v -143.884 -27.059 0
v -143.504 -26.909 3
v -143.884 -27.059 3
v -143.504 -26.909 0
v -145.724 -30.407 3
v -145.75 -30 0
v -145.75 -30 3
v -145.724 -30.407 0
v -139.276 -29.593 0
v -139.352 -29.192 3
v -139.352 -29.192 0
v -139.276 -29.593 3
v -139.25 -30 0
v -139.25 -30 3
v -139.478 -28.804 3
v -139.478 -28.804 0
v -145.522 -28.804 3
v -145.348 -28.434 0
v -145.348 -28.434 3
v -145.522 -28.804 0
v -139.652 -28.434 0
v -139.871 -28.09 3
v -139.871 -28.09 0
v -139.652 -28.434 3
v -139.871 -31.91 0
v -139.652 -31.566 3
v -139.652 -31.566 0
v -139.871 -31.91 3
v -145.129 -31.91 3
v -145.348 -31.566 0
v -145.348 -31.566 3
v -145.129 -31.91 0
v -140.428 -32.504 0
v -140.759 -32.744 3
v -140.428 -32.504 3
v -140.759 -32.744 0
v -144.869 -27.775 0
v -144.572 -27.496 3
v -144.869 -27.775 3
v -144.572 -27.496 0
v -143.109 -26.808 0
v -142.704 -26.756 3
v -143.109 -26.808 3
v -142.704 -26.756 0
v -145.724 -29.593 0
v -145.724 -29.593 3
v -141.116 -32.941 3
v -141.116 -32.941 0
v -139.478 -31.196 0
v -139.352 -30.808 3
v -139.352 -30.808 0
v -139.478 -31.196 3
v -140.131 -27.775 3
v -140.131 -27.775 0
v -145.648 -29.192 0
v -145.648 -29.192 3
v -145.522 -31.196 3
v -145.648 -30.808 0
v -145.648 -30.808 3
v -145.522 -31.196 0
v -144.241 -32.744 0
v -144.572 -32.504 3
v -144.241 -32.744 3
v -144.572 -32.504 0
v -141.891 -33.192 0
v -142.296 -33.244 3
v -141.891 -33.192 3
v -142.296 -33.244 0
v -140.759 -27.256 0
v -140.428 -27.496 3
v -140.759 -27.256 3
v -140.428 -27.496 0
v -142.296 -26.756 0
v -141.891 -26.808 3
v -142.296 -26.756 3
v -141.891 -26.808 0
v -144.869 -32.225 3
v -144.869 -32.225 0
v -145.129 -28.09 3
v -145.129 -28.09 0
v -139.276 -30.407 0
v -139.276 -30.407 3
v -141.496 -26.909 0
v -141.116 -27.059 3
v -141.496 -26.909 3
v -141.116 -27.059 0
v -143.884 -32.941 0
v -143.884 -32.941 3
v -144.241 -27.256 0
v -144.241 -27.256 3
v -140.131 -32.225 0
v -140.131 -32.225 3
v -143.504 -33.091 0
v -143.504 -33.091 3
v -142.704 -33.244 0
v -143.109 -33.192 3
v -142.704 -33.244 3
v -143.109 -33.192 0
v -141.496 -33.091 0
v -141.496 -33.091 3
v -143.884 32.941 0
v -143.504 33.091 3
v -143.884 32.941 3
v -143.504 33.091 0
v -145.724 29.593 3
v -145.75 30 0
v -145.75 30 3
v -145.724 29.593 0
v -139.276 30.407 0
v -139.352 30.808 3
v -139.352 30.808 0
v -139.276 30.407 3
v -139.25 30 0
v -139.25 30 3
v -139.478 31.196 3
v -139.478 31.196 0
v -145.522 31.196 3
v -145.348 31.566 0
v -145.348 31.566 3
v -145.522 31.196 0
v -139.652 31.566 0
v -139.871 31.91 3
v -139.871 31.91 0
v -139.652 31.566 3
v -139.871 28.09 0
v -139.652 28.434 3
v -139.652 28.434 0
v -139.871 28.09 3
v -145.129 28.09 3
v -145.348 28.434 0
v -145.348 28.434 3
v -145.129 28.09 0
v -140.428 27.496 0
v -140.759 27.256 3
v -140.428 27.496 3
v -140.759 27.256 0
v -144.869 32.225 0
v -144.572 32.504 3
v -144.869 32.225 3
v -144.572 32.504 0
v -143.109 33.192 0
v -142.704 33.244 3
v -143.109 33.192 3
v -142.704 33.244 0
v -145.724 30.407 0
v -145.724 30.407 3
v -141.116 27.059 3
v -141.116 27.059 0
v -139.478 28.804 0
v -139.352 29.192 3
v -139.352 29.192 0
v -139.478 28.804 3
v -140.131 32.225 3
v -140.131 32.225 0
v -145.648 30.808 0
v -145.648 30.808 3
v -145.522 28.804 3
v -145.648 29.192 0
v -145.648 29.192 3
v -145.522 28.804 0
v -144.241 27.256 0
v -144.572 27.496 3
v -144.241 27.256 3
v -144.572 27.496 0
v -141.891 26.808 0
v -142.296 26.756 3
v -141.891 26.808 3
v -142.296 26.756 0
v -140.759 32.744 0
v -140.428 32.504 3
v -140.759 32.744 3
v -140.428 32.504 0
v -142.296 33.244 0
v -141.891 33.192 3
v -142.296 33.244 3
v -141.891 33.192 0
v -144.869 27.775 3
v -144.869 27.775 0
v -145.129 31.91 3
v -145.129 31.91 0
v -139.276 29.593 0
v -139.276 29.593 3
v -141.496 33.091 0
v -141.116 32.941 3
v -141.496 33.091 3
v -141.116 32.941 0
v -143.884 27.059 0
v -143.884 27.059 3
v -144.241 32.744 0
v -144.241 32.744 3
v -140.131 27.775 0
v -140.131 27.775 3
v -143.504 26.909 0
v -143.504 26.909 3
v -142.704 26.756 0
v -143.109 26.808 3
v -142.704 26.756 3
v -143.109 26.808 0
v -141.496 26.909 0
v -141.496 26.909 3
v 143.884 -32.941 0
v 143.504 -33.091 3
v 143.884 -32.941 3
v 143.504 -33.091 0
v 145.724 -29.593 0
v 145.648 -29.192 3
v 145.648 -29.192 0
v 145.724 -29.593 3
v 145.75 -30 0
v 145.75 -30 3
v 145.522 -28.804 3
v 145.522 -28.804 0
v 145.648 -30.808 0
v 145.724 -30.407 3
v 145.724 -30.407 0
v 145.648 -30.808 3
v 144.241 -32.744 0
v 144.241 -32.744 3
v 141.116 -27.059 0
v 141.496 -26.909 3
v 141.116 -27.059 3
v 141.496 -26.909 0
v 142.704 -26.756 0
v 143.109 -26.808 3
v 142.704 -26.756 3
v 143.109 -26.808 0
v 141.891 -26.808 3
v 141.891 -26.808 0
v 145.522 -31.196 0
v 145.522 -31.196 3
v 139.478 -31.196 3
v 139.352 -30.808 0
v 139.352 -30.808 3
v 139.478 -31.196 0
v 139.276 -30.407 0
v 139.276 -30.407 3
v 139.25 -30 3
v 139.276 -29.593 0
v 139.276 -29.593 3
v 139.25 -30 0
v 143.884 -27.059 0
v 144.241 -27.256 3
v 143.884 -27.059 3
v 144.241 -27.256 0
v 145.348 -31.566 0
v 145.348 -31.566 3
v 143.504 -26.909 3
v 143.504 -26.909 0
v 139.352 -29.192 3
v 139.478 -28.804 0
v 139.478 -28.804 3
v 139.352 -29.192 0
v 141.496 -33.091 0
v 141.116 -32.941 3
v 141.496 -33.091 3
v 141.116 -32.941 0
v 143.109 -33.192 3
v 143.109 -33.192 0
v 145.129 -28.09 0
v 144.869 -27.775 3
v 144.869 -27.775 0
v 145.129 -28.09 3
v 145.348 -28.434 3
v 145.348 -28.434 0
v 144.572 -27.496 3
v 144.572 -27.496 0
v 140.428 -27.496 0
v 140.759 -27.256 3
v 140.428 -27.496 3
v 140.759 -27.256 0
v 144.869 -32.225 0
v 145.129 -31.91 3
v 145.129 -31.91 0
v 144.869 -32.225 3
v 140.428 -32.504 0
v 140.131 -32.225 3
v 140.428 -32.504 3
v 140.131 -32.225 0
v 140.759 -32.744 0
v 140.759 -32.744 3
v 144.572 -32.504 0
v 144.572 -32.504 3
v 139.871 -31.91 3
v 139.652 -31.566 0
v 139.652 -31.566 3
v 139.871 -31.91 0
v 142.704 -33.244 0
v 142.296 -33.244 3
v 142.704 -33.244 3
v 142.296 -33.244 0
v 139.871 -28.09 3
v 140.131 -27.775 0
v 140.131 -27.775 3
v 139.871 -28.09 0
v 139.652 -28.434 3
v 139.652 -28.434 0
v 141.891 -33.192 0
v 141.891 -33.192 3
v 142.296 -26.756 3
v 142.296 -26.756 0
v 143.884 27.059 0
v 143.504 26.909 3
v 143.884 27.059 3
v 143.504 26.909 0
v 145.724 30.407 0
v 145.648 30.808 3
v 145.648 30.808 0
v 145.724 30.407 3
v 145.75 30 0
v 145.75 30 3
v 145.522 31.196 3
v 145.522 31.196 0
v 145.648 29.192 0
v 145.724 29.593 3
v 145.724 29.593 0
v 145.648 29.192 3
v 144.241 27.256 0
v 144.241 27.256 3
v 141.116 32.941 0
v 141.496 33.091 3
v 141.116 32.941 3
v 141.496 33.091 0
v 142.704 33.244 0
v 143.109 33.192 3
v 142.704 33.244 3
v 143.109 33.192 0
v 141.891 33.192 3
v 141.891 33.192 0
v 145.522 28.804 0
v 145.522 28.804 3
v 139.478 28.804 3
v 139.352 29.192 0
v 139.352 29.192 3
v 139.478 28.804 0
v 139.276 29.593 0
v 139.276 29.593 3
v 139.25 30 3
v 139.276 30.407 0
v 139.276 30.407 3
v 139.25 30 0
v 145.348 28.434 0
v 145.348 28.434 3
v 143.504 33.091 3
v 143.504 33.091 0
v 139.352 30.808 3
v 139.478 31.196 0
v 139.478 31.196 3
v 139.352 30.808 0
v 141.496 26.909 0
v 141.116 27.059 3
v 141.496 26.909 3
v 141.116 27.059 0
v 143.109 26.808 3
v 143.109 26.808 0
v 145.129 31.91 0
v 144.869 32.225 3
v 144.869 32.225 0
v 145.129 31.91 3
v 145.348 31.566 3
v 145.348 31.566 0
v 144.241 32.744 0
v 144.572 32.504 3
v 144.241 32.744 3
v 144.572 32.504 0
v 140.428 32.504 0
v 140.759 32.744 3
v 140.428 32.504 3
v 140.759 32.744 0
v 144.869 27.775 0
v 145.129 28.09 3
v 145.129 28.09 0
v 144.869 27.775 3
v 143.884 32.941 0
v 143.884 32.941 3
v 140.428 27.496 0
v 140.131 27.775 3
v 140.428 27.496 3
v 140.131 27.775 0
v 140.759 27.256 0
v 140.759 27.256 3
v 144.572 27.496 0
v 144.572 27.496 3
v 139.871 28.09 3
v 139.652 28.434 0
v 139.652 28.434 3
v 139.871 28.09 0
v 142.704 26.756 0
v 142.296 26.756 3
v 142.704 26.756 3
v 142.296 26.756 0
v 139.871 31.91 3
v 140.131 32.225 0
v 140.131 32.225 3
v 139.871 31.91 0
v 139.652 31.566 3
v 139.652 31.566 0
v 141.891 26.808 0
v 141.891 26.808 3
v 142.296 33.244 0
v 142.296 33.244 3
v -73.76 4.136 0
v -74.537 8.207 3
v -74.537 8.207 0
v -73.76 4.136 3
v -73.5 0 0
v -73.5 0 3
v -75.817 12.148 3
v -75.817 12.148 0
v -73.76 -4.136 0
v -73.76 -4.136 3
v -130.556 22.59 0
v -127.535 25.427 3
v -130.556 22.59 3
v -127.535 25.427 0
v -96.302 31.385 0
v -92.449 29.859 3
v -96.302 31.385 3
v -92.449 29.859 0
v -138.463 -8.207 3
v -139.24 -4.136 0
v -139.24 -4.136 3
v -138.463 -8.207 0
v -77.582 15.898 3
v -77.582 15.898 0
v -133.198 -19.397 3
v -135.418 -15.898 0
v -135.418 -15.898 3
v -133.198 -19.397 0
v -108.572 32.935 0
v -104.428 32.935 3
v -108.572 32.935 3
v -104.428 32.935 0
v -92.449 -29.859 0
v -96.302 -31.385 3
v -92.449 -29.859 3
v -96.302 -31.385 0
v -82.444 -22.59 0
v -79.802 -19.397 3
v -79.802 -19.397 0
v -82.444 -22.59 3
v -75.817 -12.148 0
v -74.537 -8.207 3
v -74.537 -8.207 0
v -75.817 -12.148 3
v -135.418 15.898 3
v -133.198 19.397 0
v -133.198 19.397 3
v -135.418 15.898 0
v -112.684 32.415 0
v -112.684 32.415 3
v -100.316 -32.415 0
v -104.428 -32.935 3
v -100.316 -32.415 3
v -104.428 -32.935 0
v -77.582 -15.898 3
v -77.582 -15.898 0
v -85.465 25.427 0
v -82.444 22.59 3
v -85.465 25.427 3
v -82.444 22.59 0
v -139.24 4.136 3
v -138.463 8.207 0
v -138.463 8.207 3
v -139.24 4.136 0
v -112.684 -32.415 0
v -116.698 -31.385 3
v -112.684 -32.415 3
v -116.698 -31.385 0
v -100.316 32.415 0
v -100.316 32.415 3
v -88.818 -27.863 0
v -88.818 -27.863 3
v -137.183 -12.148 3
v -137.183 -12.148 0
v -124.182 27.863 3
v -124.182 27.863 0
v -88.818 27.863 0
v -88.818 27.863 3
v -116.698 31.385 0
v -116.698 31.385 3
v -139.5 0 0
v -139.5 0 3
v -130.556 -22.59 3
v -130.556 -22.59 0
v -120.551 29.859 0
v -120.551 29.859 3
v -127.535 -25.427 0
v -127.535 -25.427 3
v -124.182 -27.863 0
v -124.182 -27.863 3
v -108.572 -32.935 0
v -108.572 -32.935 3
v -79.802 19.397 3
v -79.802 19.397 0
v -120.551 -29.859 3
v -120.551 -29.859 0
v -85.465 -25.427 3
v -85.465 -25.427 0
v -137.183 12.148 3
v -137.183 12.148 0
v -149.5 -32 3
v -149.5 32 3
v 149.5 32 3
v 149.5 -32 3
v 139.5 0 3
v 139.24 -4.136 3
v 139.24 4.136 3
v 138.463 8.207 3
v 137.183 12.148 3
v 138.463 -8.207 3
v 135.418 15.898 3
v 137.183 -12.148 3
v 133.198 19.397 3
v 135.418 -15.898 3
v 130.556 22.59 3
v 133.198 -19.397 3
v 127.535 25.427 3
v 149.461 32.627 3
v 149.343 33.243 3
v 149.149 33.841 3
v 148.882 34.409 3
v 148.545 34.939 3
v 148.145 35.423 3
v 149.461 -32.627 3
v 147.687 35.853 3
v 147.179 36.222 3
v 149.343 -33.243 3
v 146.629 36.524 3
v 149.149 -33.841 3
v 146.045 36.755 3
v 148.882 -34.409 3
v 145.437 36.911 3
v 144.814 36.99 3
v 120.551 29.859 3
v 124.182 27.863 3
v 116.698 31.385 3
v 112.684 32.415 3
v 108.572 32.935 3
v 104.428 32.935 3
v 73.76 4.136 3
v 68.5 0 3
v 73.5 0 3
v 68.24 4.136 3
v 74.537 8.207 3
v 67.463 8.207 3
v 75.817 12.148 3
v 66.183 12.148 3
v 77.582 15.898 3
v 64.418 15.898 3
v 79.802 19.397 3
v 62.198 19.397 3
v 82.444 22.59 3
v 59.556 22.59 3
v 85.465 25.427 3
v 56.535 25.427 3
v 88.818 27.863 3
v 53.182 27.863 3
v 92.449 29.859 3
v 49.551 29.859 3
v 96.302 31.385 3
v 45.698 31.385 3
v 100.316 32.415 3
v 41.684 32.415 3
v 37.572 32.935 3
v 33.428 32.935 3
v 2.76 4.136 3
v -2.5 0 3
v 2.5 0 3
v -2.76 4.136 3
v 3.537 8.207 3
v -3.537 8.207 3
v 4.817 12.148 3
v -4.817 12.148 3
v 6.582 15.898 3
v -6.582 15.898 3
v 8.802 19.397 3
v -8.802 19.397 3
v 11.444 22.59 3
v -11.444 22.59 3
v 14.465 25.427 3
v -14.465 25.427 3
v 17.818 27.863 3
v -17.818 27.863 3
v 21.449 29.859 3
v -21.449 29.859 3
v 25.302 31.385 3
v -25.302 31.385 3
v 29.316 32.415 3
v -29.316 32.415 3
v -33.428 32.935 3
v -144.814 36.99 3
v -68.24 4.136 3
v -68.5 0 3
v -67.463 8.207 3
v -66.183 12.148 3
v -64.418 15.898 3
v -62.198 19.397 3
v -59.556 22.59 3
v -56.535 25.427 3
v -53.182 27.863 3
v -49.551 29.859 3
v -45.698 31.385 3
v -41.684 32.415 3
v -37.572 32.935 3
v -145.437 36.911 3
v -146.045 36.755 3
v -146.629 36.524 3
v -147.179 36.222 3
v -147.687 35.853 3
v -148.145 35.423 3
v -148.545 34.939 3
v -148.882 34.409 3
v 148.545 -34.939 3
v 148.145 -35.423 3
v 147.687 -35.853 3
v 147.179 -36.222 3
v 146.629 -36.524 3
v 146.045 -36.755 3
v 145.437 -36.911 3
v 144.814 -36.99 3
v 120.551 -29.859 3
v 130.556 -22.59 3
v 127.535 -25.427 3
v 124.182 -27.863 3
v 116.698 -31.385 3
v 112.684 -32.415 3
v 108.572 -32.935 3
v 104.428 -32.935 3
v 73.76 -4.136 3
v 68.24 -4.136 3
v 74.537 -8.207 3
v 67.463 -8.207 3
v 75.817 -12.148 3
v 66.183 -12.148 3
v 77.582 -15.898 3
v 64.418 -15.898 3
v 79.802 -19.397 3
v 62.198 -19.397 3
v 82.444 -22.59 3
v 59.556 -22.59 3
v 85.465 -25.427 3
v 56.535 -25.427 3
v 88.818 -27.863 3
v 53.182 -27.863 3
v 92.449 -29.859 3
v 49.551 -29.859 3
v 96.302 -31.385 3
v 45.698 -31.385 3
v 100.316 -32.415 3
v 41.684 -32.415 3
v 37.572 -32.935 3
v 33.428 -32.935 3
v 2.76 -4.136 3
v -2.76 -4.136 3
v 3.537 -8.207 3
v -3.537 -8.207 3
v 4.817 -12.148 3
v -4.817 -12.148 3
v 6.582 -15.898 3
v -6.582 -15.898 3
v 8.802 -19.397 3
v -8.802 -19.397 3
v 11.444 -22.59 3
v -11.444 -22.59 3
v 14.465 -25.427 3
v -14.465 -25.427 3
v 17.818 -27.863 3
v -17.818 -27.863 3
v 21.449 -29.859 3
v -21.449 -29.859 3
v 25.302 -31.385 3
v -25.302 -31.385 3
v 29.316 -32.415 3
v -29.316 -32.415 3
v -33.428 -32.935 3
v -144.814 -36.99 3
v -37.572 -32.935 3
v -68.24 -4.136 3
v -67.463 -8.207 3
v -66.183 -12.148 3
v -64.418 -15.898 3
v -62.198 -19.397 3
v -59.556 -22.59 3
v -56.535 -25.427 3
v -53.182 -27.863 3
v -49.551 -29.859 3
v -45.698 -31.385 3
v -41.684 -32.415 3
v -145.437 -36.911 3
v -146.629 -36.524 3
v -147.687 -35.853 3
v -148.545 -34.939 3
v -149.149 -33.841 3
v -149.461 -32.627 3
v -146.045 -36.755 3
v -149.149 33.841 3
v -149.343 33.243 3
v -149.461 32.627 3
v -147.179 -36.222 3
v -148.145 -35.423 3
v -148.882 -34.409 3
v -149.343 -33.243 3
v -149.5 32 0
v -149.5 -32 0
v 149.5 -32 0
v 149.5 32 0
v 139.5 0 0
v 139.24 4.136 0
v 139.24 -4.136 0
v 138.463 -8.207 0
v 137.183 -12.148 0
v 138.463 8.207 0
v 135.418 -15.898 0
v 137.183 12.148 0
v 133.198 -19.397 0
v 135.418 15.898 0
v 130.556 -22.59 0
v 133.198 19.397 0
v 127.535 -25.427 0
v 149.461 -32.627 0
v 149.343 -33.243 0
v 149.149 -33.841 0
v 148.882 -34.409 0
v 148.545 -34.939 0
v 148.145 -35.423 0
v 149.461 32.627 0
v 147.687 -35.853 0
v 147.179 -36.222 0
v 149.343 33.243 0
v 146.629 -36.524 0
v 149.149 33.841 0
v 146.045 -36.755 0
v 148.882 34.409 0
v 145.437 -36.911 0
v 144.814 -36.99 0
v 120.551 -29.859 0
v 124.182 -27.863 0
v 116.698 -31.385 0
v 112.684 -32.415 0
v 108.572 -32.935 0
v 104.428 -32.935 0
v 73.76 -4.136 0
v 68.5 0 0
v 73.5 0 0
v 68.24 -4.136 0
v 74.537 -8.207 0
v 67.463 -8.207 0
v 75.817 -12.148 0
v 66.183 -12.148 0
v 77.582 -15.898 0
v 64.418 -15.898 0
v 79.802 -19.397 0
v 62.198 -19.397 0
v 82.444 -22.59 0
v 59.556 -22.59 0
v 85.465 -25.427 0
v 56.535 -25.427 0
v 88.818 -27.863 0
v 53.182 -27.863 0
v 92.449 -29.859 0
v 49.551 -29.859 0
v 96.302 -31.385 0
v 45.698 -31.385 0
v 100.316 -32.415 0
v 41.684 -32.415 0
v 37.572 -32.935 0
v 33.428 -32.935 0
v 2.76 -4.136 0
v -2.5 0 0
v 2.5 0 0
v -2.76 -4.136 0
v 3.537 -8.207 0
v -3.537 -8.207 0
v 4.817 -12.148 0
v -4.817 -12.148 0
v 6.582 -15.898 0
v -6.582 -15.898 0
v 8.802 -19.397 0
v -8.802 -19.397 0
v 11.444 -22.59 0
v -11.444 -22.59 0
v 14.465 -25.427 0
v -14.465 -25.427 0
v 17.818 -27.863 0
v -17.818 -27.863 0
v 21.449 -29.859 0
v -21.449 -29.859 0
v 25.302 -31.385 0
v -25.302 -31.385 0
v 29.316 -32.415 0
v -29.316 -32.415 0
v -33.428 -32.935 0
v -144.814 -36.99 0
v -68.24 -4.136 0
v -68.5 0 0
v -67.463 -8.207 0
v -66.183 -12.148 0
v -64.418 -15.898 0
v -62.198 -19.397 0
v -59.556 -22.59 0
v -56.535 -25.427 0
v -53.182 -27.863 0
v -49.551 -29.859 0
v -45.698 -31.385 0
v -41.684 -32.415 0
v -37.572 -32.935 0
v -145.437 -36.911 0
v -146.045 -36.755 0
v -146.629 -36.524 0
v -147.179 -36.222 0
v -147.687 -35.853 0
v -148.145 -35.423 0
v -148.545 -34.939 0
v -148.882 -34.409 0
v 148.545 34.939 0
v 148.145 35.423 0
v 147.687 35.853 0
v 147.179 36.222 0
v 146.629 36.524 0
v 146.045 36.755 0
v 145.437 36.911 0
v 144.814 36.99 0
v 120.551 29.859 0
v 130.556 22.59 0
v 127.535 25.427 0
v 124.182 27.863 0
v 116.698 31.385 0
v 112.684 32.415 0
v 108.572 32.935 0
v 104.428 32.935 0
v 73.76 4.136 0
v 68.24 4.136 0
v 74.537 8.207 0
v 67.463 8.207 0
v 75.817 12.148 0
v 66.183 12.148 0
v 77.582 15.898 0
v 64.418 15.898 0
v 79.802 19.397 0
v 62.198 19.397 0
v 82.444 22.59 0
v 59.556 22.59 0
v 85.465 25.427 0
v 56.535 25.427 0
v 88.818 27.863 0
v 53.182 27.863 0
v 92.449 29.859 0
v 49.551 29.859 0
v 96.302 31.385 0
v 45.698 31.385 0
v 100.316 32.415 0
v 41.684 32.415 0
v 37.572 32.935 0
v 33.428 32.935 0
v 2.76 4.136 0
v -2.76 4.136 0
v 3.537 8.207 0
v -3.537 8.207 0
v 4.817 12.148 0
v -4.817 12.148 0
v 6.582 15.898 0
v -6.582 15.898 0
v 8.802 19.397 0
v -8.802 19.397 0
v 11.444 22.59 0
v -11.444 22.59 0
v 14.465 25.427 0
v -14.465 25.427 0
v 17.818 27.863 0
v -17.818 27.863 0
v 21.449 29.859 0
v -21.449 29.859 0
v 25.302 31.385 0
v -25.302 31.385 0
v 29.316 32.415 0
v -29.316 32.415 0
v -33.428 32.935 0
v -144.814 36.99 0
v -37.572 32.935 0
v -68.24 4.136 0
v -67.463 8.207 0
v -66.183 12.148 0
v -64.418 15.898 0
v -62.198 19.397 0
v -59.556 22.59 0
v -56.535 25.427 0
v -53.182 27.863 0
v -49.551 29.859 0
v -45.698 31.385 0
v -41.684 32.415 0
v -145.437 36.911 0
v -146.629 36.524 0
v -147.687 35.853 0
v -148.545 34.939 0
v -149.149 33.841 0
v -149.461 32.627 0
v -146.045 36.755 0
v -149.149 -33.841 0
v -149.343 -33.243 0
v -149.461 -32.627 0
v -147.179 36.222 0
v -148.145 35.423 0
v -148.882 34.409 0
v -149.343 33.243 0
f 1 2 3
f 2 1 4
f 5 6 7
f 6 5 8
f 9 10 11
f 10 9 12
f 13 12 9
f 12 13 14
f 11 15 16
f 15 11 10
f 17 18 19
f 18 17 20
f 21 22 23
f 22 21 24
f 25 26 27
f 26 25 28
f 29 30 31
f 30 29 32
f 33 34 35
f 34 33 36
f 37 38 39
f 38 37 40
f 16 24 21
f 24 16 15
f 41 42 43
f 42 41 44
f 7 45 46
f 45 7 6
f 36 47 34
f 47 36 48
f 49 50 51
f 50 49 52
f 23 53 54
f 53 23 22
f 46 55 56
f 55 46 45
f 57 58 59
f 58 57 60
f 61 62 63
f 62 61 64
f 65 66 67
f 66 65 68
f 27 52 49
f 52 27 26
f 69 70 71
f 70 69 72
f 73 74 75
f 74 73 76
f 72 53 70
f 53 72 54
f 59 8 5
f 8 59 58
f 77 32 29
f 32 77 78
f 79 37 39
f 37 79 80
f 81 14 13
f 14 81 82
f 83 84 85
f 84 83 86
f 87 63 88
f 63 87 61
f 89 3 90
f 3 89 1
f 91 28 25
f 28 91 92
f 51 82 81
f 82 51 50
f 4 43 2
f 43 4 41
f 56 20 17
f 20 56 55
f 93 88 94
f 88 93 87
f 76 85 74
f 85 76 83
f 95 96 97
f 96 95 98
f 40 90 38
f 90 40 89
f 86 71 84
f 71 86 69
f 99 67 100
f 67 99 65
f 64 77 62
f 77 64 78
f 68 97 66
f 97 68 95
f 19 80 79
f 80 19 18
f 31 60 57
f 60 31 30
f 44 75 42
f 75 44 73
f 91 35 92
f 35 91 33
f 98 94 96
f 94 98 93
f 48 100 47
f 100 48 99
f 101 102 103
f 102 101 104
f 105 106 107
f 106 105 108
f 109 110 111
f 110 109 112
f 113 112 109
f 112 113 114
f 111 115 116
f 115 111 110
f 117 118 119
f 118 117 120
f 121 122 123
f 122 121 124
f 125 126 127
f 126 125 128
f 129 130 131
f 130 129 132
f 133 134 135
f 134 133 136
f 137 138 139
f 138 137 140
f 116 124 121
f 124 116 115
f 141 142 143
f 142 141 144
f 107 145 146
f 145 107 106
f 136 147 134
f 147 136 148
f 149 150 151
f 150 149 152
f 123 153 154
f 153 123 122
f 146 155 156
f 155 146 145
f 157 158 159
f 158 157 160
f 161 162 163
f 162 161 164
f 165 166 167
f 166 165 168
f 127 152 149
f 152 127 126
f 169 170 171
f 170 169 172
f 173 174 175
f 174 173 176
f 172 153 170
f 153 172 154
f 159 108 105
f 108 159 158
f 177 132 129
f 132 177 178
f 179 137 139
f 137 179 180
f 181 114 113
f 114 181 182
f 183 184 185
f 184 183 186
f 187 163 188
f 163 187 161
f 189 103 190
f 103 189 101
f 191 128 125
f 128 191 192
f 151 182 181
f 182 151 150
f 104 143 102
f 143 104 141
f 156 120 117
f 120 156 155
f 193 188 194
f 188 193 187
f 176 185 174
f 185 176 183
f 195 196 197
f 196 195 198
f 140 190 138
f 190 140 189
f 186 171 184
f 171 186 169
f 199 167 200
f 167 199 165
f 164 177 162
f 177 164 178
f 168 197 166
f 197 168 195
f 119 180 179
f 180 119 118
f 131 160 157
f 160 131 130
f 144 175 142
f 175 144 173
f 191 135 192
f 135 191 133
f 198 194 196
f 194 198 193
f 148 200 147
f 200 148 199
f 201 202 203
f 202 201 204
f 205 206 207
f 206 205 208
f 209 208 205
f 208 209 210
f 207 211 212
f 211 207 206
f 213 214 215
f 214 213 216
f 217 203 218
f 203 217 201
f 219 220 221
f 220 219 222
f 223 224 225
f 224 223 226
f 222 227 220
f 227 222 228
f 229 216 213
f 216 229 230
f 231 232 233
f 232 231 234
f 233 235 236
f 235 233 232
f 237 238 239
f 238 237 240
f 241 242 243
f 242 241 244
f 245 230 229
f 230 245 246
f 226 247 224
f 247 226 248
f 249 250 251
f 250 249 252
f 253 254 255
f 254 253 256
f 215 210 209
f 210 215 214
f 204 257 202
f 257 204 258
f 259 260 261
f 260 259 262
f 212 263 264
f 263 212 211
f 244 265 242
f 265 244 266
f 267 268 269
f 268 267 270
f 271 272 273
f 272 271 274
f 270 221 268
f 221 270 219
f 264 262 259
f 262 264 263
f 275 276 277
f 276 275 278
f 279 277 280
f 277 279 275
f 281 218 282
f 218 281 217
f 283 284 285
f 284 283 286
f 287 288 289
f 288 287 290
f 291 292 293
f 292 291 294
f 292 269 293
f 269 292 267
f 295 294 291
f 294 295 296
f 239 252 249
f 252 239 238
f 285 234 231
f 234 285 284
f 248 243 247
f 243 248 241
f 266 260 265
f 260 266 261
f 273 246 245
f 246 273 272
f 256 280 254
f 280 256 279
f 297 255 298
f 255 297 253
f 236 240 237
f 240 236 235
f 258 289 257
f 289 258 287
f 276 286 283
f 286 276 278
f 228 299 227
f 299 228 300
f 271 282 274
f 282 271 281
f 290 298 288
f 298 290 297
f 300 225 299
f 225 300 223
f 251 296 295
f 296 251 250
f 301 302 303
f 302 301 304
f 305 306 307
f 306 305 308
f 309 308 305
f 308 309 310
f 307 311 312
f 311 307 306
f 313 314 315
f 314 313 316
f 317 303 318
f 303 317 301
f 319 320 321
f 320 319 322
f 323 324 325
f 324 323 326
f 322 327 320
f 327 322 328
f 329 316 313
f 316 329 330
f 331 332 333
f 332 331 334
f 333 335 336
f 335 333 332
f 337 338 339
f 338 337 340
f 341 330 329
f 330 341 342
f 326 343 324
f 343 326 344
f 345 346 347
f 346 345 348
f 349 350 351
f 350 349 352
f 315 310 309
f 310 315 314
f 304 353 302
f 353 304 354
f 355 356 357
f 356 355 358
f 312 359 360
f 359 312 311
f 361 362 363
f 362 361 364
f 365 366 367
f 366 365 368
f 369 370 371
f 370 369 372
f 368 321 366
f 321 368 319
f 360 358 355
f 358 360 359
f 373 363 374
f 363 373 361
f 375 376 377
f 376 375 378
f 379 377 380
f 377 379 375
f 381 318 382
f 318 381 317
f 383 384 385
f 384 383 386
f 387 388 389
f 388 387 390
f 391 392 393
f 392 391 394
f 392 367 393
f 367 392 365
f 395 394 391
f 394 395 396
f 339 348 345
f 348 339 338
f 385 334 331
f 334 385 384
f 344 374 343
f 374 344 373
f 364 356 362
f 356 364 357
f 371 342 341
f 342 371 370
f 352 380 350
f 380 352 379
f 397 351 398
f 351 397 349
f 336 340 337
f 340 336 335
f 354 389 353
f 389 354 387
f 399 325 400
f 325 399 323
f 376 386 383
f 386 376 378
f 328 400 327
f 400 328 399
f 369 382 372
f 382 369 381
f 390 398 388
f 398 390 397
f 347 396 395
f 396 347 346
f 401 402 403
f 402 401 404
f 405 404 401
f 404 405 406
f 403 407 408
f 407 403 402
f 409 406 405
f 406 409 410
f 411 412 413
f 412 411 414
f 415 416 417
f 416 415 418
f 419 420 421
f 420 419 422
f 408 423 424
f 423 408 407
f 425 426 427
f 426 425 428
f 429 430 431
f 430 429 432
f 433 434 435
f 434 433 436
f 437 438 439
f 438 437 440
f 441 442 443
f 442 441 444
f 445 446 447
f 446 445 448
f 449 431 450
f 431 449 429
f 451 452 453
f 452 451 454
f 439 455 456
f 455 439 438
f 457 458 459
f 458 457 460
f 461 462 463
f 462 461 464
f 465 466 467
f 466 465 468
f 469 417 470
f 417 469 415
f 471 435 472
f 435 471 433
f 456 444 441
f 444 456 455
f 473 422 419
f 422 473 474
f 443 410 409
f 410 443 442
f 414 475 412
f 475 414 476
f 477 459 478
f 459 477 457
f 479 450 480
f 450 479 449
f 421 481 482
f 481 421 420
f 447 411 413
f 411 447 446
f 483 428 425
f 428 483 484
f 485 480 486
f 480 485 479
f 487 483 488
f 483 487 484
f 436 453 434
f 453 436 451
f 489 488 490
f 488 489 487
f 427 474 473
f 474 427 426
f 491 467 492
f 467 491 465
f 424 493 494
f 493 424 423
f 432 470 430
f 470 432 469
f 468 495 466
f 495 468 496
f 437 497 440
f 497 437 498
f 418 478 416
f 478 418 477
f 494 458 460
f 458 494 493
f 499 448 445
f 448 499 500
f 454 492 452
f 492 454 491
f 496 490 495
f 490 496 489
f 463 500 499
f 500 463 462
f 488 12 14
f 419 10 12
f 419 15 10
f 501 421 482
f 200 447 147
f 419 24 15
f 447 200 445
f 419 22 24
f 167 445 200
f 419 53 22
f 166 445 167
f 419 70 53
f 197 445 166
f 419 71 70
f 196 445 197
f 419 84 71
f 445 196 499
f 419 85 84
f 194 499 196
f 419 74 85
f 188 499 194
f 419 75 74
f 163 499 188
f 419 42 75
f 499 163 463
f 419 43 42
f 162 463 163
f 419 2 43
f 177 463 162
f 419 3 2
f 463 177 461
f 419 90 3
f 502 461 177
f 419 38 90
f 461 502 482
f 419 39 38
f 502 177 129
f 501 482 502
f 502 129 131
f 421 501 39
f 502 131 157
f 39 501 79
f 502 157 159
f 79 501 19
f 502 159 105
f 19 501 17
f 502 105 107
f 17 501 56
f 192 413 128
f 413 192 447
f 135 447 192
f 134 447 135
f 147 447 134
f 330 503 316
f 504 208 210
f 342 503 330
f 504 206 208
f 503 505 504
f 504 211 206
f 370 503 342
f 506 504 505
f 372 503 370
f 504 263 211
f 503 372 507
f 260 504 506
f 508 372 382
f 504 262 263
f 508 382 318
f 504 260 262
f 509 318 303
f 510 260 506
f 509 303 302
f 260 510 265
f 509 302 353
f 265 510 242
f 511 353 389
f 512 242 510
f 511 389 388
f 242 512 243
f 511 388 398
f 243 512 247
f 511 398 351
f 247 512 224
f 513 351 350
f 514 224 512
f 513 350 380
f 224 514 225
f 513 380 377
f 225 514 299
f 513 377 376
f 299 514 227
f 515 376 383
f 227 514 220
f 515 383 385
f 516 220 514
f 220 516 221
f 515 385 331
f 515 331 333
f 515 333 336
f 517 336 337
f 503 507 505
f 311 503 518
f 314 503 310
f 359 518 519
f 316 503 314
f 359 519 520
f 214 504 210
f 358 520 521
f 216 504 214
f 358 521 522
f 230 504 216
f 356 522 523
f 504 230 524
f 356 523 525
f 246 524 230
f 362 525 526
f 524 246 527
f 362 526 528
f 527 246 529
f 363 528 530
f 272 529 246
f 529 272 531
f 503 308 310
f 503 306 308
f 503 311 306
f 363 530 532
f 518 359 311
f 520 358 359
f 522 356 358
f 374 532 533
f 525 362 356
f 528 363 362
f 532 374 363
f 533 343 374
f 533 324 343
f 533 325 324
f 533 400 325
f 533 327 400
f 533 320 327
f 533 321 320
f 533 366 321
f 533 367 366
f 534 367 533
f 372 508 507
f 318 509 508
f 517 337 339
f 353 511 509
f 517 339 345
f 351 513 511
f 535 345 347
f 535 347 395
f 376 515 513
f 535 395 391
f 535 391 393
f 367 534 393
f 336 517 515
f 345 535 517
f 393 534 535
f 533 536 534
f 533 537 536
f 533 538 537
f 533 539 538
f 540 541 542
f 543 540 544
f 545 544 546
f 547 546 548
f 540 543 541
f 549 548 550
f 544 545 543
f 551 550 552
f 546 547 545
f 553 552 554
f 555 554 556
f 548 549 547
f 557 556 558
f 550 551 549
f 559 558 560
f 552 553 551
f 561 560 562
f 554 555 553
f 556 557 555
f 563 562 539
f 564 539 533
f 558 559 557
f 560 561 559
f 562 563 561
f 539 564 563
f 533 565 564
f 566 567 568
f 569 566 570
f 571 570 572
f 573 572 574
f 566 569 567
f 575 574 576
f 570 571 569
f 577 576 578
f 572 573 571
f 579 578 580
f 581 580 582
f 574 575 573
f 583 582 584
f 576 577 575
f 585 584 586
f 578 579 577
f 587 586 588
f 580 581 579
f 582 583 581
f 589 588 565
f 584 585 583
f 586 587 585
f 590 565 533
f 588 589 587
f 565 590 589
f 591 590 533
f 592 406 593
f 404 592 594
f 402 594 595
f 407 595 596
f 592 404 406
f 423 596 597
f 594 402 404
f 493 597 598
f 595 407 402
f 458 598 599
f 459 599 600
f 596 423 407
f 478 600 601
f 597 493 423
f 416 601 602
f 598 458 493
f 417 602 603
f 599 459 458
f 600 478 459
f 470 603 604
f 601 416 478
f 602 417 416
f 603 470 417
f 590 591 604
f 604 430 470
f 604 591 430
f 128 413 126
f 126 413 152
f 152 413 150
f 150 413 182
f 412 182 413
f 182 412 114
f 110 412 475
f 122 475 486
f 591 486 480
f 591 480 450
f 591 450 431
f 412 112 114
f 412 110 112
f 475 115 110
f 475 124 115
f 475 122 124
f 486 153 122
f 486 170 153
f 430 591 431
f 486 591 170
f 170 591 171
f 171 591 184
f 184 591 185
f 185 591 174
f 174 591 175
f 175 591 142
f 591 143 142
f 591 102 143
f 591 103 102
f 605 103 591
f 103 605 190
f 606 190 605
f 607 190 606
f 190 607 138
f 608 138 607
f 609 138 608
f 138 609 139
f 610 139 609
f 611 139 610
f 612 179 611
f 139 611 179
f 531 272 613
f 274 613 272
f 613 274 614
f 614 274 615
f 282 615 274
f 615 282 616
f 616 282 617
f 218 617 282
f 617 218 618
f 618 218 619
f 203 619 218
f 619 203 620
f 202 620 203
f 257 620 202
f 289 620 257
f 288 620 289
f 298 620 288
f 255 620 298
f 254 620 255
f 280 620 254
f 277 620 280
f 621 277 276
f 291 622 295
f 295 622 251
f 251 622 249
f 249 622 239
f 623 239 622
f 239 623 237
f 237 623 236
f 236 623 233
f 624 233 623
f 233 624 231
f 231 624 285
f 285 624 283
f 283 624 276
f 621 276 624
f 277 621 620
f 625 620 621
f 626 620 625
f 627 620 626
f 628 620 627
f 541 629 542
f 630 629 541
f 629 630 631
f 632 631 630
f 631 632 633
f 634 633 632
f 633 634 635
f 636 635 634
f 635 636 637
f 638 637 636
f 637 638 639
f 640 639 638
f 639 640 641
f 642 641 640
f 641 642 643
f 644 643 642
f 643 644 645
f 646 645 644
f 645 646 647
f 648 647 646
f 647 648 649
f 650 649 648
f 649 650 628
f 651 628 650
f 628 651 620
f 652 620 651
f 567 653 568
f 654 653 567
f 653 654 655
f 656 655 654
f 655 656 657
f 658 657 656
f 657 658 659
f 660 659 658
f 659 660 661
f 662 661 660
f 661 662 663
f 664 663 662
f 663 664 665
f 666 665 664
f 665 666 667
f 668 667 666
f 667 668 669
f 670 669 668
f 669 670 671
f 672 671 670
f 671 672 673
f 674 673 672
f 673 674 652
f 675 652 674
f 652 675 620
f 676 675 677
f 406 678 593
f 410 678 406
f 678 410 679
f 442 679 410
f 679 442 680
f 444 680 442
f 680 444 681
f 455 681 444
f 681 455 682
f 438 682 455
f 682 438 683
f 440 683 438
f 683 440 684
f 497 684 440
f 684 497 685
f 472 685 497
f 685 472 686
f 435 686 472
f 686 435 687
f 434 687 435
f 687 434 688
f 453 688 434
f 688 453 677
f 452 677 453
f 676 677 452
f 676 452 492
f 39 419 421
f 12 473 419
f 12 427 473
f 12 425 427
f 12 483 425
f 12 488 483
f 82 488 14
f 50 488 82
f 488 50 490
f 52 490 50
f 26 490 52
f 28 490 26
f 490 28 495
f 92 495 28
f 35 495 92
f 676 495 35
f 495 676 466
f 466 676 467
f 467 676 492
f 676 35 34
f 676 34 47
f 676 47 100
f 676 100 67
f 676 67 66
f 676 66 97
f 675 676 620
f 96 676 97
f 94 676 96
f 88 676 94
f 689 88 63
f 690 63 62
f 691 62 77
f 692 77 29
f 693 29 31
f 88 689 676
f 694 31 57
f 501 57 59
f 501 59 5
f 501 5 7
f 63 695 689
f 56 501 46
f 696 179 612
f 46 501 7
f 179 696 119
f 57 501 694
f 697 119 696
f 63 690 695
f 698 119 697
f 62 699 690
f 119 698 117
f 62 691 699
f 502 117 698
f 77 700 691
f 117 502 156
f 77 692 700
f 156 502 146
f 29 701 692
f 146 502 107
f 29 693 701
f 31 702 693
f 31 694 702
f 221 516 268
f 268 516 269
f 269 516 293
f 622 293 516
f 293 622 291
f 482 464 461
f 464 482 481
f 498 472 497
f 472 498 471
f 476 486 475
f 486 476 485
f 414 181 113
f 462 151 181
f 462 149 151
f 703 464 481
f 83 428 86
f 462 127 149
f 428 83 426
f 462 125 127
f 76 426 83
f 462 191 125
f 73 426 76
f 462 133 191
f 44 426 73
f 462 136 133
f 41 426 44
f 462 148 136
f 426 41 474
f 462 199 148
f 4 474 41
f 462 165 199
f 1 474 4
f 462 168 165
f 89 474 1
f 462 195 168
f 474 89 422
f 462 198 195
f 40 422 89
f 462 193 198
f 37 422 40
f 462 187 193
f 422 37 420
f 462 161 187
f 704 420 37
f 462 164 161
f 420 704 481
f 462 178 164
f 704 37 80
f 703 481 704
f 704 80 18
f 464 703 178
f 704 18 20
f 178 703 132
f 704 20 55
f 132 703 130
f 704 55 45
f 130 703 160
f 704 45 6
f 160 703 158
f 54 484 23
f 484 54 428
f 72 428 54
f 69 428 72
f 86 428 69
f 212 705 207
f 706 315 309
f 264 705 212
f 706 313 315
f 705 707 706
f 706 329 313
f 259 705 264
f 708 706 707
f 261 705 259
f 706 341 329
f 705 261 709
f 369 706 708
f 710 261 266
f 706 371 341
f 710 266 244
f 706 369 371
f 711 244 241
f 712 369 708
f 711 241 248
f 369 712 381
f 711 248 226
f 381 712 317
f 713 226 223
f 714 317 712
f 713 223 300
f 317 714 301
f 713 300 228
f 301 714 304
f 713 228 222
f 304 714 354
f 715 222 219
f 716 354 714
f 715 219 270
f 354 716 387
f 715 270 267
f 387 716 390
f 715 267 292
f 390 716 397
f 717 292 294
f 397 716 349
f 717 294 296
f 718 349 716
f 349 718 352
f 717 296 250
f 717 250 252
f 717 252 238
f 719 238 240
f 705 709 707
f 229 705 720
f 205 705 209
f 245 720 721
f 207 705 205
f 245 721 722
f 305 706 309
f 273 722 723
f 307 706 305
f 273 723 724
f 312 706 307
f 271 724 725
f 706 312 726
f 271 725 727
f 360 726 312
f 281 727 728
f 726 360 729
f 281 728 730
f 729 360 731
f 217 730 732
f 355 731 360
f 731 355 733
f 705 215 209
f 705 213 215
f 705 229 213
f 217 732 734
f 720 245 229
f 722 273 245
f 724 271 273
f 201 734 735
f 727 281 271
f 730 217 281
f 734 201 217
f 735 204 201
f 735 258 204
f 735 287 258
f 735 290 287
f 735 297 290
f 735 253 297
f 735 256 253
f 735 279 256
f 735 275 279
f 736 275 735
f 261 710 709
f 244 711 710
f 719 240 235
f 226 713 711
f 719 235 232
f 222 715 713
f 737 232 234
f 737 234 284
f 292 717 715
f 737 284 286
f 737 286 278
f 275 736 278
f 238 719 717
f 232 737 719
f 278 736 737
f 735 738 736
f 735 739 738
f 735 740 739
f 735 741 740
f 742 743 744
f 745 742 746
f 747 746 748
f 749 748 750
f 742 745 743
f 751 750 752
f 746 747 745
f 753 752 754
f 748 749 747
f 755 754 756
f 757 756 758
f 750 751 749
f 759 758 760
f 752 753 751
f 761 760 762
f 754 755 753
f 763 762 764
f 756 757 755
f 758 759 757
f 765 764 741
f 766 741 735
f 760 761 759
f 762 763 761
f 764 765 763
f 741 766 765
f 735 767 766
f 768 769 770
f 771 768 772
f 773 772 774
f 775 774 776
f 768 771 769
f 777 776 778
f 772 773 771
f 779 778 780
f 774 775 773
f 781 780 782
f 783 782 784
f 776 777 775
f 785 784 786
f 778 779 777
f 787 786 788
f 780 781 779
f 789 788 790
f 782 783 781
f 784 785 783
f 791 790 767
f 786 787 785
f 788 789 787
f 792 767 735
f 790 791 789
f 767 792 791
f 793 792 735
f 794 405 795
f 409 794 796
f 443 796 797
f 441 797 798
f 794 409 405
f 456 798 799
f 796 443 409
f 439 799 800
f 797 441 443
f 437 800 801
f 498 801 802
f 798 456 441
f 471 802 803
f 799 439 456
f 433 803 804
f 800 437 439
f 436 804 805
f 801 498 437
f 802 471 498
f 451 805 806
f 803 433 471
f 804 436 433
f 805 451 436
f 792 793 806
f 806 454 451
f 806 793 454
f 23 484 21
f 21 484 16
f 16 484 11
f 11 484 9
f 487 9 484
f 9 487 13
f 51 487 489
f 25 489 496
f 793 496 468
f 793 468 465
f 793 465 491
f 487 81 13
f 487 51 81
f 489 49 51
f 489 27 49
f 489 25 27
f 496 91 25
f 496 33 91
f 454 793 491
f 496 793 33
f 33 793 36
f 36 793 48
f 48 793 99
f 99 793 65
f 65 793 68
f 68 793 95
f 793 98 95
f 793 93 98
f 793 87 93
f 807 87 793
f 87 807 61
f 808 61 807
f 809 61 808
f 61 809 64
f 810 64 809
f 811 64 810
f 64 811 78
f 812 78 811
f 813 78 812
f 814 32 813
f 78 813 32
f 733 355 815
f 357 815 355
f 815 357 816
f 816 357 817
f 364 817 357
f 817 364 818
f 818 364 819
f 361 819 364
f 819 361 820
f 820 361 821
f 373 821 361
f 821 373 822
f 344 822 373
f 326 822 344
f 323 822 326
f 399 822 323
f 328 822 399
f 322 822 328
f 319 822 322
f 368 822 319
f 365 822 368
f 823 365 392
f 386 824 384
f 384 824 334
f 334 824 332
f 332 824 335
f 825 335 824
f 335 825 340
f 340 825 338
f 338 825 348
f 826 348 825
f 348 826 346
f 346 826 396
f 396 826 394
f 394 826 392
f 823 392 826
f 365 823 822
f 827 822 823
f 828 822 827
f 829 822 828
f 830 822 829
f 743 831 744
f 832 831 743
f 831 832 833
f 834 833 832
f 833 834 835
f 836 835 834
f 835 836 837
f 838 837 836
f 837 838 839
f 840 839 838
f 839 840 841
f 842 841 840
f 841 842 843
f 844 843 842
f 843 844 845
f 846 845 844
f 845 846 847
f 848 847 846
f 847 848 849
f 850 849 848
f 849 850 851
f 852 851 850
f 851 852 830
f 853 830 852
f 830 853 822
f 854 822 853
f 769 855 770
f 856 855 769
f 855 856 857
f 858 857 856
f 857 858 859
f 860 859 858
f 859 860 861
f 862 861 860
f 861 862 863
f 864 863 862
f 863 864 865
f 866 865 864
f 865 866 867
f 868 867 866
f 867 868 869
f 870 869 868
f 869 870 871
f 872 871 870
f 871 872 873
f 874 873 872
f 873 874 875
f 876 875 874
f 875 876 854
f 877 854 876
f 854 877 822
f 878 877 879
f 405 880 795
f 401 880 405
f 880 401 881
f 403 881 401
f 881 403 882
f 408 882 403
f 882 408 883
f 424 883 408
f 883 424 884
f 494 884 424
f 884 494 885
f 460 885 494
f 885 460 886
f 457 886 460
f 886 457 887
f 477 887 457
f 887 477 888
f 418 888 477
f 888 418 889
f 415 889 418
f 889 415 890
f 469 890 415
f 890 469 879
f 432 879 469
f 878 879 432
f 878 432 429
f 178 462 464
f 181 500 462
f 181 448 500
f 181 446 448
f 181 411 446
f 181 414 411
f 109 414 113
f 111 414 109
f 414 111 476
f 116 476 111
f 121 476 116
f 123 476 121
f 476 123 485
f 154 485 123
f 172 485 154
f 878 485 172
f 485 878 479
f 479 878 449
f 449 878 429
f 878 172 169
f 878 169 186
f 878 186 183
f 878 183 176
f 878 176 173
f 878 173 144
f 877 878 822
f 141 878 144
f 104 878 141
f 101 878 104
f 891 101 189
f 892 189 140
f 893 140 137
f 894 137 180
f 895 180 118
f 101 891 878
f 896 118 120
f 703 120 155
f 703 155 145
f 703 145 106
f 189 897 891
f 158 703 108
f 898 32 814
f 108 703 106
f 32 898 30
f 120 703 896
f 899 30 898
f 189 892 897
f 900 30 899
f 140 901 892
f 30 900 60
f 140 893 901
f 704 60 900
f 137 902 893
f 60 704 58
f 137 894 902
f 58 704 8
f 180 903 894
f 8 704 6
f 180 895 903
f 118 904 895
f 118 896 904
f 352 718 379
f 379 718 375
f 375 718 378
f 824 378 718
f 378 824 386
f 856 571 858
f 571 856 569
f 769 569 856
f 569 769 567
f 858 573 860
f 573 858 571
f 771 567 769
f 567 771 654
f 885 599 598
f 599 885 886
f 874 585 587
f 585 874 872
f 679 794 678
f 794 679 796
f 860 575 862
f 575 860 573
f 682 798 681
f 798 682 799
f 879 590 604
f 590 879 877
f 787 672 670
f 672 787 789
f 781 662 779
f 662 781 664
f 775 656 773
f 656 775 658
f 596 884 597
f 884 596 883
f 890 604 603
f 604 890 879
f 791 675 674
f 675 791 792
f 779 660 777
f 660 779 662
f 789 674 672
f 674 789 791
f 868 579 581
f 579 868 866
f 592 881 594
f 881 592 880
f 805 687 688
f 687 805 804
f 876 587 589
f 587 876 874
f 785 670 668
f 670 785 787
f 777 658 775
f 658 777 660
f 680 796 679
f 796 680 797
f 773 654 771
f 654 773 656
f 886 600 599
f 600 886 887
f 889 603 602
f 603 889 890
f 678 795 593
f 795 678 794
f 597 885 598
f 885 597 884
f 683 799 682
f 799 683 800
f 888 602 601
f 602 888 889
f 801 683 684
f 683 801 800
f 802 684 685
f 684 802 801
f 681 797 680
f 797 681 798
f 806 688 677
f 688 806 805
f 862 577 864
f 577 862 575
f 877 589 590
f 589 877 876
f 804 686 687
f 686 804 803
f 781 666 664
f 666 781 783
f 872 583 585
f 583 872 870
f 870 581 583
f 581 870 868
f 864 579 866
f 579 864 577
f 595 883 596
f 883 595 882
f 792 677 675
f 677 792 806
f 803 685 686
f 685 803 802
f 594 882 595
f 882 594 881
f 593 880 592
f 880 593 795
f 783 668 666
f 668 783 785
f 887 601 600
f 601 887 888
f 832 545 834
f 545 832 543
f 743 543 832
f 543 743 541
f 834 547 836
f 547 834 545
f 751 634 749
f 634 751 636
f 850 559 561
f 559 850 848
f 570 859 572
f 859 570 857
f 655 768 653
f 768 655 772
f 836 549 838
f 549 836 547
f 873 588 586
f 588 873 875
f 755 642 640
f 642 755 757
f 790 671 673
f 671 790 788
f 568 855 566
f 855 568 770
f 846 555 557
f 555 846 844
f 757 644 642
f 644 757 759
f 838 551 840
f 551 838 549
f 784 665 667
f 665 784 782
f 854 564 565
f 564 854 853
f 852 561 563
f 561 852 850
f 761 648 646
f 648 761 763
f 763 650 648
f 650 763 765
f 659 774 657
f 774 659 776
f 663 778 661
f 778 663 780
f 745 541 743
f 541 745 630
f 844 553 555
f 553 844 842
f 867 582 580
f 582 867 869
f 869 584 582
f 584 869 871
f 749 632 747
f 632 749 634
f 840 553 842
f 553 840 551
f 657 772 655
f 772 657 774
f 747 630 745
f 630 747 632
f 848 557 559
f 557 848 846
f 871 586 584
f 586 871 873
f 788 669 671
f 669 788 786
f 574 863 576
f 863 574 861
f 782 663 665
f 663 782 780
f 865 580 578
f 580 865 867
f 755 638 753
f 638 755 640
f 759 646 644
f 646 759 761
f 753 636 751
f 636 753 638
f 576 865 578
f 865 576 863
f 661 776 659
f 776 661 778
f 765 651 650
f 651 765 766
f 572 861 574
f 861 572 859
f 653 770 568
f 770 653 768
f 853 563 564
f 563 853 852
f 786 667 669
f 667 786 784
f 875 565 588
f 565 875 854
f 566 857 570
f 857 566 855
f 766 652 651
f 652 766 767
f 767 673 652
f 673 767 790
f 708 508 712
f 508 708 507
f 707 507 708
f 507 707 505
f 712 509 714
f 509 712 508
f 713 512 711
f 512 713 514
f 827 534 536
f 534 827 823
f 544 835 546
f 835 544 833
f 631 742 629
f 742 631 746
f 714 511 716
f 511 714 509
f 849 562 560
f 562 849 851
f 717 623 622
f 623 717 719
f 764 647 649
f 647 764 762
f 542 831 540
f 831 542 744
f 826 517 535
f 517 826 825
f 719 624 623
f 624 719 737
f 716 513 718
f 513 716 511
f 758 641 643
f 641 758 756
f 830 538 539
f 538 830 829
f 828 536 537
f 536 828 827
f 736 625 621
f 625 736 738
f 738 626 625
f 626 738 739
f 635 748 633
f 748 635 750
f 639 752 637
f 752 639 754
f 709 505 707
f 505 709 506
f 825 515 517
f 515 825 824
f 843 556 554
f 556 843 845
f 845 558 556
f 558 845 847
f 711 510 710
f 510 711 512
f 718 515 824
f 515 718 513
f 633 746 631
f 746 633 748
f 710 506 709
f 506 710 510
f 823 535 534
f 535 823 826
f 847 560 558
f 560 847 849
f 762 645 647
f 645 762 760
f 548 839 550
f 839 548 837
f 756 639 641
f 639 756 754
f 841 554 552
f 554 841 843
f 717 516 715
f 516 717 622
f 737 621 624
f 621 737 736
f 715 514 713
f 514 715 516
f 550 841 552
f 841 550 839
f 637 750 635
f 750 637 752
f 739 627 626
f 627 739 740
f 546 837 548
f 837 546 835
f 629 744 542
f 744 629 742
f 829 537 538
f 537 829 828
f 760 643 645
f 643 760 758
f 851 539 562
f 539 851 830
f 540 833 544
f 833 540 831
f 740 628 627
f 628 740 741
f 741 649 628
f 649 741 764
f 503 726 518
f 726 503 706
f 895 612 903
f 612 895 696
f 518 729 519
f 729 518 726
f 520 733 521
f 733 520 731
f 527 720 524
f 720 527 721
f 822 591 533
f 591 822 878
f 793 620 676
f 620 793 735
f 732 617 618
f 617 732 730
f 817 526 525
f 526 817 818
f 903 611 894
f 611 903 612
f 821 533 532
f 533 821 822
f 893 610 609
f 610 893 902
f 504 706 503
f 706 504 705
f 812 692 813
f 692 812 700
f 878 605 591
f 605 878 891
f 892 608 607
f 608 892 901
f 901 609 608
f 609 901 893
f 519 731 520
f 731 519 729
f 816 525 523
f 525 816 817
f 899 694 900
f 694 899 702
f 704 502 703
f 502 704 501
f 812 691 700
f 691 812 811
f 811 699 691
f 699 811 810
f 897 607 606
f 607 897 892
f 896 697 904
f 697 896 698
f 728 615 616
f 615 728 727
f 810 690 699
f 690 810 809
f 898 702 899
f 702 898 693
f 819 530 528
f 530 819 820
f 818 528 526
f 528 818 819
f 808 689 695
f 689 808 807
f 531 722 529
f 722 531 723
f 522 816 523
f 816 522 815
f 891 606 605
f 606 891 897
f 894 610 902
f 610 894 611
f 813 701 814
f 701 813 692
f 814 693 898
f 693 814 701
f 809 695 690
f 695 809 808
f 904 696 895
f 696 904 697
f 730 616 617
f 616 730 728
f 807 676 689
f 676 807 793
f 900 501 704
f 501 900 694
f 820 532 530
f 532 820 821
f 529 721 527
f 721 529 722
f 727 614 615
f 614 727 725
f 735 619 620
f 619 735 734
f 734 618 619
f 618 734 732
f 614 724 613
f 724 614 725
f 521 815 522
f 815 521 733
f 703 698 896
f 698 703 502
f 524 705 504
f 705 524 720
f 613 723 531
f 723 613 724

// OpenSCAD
$fn = 50;


difference() {
	union() {
		hull() {
			translate(v = [-144.5000000000, 32.0000000000, 0]) {
				cylinder(h = 3, r = 5);
			}
			translate(v = [144.5000000000, 32.0000000000, 0]) {
				cylinder(h = 3, r = 5);
			}
			translate(v = [-144.5000000000, -32.0000000000, 0]) {
				cylinder(h = 3, r = 5);
			}
			translate(v = [144.5000000000, -32.0000000000, 0]) {
				cylinder(h = 3, r = 5);
			}
		}
	}
	union() {
		#translate(v = [-142.5000000000, -30.0000000000, -100.0000000000]) {
			cylinder(h = 200, r = 3.2500000000);
		}
		#translate(v = [-142.5000000000, 30.0000000000, -100.0000000000]) {
			cylinder(h = 200, r = 3.2500000000);
		}
		#translate(v = [142.5000000000, -30.0000000000, -100.0000000000]) {
			cylinder(h = 200, r = 3.2500000000);
		}
		#translate(v = [142.5000000000, 30.0000000000, -100.0000000000]) {
			cylinder(h = 200, r = 3.2500000000);
		}
		#translate(v = [-106.5000000000, 0, 0]) {
			cylinder(h = 3, r = 33.0000000000);
		}
		#translate(v = [-35.5000000000, 0, 0]) {
			cylinder(h = 3, r = 33.0000000000);
		}
		#translate(v = [35.5000000000, 0, 0]) {
			cylinder(h = 3, r = 33.0000000000);
		}
		#translate(v = [106.5000000000, 0, 0]) {
			cylinder(h = 3, r = 33.0000000000);
		}
	}
}
